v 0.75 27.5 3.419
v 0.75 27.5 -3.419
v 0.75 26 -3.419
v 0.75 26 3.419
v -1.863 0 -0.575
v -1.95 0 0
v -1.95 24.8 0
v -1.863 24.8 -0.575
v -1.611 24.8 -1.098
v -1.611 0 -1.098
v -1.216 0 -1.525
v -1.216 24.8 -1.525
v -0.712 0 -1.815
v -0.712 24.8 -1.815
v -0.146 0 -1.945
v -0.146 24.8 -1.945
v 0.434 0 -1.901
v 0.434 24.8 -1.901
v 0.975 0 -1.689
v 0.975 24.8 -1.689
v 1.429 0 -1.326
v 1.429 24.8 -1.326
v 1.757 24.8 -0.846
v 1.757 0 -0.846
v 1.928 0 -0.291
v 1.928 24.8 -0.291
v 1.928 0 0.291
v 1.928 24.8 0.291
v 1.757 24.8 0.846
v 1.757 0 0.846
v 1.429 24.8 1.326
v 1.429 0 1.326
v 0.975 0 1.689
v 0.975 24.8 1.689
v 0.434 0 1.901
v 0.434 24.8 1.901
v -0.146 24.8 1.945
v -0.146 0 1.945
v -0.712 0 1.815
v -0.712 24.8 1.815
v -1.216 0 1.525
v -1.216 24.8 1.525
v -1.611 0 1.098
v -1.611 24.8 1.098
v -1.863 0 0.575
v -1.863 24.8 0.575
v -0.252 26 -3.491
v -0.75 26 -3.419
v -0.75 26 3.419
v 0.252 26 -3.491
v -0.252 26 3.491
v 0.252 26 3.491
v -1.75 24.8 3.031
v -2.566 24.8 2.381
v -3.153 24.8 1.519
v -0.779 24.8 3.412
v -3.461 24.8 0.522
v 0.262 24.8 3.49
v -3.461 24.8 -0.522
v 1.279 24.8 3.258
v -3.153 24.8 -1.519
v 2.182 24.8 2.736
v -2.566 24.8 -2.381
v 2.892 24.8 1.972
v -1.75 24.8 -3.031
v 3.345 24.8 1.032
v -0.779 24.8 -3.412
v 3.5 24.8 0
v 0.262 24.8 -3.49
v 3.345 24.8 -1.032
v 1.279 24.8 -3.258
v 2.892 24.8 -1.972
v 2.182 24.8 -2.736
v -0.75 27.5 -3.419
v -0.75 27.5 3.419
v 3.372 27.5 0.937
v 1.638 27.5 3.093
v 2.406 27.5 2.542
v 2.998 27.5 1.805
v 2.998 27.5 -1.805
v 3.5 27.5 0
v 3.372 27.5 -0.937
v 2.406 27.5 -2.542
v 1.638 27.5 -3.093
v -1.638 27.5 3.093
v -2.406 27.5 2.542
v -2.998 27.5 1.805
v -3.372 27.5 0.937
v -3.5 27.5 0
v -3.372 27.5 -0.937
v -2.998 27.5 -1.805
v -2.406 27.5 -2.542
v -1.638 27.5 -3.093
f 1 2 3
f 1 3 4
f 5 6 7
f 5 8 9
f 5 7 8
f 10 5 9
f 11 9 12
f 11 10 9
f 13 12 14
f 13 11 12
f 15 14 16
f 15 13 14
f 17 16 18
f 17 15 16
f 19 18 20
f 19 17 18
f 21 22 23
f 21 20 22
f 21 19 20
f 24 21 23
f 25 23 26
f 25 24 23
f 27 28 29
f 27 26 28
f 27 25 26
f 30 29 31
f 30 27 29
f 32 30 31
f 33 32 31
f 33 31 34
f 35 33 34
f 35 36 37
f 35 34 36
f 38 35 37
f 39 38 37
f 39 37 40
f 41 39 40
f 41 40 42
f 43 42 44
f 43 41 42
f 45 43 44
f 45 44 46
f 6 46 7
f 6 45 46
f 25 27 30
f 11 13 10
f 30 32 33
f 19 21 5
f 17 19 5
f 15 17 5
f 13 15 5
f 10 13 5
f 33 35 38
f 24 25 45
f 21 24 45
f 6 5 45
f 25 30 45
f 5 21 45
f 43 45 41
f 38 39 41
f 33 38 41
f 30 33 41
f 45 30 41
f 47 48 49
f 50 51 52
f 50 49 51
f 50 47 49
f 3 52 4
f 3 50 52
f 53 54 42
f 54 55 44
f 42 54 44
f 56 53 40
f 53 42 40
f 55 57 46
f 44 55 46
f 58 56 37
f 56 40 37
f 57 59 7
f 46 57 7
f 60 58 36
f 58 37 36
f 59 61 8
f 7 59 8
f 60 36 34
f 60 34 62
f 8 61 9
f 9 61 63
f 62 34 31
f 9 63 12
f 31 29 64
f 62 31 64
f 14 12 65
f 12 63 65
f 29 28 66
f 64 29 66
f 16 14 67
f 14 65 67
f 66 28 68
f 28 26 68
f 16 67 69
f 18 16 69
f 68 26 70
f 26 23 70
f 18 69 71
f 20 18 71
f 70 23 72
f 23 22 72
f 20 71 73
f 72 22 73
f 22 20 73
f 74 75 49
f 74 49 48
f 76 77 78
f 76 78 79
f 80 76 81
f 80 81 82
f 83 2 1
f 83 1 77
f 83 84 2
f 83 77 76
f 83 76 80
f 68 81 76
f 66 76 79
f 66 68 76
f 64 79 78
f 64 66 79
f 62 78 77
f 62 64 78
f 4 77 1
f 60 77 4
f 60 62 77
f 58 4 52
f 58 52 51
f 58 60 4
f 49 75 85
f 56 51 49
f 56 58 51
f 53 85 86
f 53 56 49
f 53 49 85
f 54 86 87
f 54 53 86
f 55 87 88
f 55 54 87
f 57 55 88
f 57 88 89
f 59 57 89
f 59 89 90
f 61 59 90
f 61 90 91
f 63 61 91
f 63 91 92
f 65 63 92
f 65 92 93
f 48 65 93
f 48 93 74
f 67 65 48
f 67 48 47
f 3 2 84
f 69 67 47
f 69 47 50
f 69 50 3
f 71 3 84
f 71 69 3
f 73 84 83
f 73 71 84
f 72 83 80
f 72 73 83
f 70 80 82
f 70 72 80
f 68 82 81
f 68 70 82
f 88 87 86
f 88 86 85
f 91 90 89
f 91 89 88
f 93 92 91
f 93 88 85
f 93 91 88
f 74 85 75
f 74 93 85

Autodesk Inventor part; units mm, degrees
ref_plane "YZ Plane" through (0, 0, 0) normal (1, 0, 0) x (0, 1, 0)
ref_plane "XZ Plane" through (0, 0, 0) normal (0, 1, 0) x (-1, 0, 0)
ref_plane "XY Plane" through (0, 0, 0) normal (0, 0, 1) x (1, 0, 0)
sketch "Sketch1" plane through (0, 0, 0) normal (0, 1, 0) x (-1, 0, 0)
  circle A0 centre (0, 0) radius 1.95
  dimension "d0" = 3.9
extrude "Extrusion1" add sketch "Sketch1" along normal blind 24.8
sketch "Sketch2" plane through (0, 24.8, 0) normal (0, 1, 0) x (1, 0, 0)
  circle A0 centre (0, 0) radius 3.5
  dimension "d3" = 7
extrude "Extrusion2" add sketch "Sketch2" along normal blind 2.7
sketch "Sketch3" plane through (0, 27.5, 0) normal (0, 1, 0) x (1, 0, 0)
  line L0 (0.75, -8) -> (-0.75, -8)
  line L1 (-0.75, -8) -> (-0.75, 8)
  line L2 (-0.75, 8) -> (0.75, 8)
  line L3 (0.75, 8) -> (0.75, -8)
  line L4 (0.75, -8) -> (-0.75, 8) construction
  line L5 (-0.75, -8) -> (0.75, 8) construction
  point P0 (0, 0)
  dimension "d6" = 1.5
  dimension "d7" = 16
extrude "Extrusion3" cut sketch "Sketch3" against normal blind 1.5
properties part number "screw27x4mm" material "Stainless Steel"
